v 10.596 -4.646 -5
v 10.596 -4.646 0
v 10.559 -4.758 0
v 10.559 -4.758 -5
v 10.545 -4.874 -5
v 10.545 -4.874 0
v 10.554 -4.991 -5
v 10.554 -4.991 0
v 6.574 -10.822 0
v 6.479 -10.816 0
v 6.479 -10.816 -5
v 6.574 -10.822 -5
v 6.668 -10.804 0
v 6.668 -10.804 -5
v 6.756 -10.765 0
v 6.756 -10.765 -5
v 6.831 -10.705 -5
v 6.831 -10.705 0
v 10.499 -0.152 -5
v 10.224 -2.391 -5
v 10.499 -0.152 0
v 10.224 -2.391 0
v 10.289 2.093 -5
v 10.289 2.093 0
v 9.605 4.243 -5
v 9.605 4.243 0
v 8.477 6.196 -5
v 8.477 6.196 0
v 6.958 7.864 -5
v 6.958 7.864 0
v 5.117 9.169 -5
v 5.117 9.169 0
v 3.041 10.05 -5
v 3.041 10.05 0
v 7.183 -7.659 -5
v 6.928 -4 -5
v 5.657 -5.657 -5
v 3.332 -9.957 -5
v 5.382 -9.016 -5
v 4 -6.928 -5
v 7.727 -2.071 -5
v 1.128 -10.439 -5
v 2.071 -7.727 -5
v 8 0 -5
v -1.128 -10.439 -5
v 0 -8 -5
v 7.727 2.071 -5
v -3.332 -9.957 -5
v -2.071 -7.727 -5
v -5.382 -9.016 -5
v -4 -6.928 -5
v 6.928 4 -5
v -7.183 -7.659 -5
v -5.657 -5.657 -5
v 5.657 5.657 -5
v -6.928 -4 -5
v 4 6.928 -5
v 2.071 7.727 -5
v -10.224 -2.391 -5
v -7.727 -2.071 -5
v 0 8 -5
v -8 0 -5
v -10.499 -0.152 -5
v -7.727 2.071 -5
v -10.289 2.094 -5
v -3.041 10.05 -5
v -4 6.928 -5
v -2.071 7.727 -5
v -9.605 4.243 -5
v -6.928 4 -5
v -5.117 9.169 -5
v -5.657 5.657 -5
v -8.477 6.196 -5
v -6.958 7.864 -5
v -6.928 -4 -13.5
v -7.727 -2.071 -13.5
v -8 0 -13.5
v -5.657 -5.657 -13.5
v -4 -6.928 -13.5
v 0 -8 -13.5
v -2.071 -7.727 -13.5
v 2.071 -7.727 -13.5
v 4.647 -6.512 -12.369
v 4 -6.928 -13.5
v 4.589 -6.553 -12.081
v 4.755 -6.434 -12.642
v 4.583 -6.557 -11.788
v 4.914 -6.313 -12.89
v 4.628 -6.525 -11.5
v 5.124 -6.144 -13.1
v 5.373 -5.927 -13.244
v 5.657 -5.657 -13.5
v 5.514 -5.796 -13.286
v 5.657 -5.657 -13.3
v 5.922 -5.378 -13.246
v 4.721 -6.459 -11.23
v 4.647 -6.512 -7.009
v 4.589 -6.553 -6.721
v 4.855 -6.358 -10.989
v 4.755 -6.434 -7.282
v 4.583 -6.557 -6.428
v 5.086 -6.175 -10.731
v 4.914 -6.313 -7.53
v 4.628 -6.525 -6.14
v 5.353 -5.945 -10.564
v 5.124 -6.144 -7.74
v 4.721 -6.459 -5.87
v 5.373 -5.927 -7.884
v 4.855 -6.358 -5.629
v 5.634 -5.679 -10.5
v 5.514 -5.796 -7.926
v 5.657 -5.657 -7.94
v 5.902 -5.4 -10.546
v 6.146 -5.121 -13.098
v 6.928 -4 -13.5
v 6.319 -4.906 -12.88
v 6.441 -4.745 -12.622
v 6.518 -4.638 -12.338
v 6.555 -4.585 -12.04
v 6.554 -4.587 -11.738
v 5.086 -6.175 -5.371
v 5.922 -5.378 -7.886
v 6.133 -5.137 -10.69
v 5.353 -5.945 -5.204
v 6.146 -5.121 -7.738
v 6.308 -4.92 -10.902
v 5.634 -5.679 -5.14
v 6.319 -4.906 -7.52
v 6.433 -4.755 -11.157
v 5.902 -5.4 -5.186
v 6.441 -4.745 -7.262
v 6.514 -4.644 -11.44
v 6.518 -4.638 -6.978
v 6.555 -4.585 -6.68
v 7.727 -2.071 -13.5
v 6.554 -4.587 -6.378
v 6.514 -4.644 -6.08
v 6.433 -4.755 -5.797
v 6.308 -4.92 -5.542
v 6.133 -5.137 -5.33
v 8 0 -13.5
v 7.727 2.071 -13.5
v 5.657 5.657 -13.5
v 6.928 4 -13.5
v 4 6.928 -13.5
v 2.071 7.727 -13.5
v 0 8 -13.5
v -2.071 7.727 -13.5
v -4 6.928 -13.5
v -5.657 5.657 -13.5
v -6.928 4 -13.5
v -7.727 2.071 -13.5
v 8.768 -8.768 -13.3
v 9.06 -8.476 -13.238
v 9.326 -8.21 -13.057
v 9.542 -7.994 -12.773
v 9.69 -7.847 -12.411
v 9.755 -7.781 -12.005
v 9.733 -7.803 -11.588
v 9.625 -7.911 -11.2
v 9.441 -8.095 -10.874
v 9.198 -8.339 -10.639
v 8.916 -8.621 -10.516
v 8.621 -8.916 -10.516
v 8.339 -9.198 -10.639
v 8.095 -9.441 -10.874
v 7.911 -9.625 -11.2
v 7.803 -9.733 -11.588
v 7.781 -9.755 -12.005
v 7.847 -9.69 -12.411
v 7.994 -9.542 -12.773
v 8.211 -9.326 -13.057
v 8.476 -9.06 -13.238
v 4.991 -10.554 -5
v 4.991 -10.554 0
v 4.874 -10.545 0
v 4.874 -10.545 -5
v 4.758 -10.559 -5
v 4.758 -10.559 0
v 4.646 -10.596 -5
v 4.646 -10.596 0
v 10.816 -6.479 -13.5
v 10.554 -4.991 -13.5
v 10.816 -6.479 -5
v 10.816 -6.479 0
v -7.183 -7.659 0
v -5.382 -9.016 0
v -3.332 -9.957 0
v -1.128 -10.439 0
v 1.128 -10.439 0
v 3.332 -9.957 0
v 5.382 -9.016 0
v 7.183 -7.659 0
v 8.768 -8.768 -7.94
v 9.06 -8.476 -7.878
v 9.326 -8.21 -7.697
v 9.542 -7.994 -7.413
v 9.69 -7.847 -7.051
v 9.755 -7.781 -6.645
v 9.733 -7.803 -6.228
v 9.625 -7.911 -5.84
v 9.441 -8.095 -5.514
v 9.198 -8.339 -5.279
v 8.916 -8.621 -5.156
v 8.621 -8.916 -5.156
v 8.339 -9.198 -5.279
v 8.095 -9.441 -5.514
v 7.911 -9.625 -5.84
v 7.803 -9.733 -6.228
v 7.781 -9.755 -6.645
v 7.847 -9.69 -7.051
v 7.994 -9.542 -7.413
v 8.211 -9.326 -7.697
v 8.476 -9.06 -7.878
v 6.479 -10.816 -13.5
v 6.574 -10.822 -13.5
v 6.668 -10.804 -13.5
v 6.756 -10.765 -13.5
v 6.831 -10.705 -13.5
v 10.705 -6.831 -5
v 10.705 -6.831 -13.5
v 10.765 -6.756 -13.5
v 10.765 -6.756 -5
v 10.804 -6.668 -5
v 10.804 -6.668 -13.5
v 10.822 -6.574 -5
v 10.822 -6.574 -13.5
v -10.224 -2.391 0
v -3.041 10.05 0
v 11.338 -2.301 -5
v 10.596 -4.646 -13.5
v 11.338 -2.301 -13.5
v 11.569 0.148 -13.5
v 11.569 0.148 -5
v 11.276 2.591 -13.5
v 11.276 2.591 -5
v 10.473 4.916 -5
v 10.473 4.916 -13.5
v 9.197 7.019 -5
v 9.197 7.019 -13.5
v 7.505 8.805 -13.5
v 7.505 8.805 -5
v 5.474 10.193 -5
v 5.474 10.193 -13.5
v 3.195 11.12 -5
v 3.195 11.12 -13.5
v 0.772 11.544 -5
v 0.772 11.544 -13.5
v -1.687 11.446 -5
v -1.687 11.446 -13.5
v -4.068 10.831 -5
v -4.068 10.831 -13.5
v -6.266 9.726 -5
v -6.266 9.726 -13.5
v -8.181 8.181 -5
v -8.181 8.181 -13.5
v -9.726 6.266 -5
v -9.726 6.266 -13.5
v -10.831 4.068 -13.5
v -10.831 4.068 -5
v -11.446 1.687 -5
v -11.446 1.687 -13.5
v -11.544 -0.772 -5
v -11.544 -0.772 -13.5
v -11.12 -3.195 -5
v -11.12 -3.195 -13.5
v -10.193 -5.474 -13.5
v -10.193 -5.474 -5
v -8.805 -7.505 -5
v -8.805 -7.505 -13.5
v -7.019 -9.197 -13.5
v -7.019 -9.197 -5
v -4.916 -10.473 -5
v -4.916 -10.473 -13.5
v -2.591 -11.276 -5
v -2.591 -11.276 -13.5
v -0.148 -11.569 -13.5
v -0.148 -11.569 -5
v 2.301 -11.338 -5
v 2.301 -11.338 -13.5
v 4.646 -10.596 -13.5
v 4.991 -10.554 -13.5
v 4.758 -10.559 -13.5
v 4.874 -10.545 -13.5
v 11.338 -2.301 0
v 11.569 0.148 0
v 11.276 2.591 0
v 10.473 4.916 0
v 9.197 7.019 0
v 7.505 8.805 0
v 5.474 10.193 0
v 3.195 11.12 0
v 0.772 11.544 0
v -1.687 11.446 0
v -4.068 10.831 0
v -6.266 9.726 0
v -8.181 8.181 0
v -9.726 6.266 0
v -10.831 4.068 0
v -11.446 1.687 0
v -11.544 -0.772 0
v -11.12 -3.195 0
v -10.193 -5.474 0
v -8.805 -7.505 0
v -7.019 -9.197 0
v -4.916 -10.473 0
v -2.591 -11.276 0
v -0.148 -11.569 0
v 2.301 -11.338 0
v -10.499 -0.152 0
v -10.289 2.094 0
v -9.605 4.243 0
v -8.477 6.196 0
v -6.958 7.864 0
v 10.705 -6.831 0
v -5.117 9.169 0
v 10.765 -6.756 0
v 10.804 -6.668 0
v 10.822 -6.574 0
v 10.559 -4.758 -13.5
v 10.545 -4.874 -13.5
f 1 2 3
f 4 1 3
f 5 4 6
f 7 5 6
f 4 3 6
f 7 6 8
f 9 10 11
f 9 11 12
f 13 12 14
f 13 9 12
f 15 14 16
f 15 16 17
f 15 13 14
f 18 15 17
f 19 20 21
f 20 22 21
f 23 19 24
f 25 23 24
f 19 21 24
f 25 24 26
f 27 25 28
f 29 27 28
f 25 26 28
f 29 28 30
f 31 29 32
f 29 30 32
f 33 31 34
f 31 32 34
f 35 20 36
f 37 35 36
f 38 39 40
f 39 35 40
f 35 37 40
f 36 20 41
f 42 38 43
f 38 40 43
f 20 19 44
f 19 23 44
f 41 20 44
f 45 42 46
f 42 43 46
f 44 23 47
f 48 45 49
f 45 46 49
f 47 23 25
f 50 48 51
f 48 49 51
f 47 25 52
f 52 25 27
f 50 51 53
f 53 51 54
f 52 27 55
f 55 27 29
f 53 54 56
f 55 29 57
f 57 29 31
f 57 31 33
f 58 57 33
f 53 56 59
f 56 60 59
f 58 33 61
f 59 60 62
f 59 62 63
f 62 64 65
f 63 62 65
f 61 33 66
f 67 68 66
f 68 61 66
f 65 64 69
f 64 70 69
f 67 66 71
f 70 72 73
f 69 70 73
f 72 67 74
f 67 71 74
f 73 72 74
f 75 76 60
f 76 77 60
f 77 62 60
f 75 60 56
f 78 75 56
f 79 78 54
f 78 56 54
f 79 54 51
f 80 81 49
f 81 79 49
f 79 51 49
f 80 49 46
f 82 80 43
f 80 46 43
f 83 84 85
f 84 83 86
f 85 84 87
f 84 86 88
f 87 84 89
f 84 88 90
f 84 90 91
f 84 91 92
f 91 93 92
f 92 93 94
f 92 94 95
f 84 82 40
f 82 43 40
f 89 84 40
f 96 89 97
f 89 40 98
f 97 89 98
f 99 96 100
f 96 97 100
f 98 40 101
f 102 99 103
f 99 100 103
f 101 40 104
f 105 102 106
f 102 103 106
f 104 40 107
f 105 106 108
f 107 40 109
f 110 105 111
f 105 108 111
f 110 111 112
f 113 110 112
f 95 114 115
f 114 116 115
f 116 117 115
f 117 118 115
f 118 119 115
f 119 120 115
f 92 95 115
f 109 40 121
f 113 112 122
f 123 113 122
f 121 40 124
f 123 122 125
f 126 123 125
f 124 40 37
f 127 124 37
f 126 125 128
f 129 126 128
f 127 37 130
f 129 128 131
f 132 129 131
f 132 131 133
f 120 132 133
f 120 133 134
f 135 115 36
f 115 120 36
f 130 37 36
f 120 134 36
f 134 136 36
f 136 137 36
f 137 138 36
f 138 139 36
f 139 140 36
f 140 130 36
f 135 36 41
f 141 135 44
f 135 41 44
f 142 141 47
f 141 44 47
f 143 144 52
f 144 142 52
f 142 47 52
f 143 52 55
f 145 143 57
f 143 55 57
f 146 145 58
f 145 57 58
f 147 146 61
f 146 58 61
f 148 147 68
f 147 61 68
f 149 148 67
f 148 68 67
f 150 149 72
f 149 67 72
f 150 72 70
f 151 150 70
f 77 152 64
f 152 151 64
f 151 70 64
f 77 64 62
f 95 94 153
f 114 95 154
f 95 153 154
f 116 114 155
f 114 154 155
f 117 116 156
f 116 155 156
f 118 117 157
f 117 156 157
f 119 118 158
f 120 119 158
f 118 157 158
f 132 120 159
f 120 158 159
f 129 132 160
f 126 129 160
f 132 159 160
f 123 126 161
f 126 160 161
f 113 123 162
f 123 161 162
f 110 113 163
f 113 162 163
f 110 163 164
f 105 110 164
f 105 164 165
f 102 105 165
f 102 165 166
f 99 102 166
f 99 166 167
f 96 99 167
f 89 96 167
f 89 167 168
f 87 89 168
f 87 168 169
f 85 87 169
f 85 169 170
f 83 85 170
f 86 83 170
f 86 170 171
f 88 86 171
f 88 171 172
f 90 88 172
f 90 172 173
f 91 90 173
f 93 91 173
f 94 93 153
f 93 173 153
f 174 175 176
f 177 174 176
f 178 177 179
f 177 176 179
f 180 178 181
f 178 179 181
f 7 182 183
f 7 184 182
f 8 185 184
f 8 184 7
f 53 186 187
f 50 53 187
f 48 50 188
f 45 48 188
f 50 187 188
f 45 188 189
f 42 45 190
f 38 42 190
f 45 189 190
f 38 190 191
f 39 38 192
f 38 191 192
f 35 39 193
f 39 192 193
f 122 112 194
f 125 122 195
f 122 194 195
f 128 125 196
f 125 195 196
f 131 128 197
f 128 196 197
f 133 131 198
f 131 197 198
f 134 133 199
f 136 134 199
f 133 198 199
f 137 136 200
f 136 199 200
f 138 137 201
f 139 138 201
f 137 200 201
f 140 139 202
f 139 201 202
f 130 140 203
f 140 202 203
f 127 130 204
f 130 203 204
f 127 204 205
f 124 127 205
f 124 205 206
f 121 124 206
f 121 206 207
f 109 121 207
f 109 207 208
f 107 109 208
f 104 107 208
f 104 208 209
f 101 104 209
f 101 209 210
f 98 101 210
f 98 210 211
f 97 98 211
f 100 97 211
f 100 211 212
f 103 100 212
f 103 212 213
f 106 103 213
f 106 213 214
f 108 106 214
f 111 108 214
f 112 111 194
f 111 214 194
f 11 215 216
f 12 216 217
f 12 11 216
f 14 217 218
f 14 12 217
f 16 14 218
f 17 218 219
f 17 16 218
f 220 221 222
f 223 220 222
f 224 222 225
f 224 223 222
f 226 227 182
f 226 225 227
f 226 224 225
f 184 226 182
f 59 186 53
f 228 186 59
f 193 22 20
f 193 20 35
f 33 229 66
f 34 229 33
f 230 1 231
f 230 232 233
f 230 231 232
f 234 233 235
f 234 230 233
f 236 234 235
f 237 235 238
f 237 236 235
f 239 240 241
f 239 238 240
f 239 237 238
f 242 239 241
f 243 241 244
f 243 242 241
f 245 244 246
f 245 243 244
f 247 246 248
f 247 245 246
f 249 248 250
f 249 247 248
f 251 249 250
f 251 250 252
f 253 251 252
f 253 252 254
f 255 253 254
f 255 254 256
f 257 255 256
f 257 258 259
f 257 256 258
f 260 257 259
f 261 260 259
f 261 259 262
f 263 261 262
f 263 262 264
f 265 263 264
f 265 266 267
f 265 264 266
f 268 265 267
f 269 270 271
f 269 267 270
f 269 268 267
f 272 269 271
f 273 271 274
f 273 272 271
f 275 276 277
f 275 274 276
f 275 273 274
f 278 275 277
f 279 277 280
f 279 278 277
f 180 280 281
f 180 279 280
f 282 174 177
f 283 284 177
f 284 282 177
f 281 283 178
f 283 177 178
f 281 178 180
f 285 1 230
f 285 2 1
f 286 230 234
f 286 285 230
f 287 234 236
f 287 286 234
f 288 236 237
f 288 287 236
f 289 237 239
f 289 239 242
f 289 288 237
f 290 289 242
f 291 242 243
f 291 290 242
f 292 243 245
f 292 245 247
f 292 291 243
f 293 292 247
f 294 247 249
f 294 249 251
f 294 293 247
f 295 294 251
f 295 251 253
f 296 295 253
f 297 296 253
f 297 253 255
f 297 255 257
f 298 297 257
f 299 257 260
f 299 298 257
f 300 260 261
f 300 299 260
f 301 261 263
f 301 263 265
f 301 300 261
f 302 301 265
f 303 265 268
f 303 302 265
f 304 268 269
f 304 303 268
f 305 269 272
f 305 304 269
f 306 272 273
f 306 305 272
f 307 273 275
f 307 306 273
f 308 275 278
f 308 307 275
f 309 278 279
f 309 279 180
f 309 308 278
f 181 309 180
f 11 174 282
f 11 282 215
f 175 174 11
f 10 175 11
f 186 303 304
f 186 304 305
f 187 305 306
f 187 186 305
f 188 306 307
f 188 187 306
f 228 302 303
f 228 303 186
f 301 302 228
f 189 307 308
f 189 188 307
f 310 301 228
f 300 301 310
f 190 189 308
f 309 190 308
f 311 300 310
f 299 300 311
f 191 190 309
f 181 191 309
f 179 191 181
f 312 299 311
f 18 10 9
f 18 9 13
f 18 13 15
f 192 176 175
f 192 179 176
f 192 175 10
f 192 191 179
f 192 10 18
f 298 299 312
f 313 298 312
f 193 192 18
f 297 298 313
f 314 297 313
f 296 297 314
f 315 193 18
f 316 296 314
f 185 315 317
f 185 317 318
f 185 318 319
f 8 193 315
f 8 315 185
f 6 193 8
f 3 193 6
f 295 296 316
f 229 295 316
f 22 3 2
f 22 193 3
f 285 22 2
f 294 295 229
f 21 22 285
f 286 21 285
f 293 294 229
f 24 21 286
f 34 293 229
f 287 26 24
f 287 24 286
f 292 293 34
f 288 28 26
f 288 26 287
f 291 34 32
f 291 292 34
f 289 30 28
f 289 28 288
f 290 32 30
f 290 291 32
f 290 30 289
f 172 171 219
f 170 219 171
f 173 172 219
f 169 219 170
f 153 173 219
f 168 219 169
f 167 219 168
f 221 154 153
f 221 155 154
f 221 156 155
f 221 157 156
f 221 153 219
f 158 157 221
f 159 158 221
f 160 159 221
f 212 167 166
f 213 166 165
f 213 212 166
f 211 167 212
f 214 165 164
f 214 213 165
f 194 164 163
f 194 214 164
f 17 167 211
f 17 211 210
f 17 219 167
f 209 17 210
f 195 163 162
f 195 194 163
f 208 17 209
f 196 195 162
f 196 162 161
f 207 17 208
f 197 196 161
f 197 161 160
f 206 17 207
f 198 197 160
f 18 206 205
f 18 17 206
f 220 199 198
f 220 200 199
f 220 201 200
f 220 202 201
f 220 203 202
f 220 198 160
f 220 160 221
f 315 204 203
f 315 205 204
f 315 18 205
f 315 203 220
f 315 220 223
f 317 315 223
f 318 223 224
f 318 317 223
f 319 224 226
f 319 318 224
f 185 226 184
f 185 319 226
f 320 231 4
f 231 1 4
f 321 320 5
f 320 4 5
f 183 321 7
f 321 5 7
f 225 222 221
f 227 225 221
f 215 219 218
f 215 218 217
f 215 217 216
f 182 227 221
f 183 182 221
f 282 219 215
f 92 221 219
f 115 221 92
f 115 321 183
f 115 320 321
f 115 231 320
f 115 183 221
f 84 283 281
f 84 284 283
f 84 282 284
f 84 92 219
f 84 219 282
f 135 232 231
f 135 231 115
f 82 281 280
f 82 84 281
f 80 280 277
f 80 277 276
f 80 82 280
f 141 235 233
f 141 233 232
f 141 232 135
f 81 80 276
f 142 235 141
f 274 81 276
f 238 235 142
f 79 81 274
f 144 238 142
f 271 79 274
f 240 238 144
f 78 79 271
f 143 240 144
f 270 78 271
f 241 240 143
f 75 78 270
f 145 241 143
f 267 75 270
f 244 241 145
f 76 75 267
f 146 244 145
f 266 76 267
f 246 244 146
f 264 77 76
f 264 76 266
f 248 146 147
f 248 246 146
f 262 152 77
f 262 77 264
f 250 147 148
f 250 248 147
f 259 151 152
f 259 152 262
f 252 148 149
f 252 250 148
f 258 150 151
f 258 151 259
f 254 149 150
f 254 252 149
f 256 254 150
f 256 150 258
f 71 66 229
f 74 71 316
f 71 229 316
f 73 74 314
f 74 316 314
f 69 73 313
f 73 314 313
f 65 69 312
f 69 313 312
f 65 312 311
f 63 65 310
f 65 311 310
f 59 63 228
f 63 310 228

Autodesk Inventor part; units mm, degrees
ref_plane "YZ Plane" through (0, 0, 0) normal (1, 0, 0) x (0, 1, 0)
ref_plane "XZ Plane" through (0, 0, 0) normal (0, 1, 0) x (-1, 0, 0)
ref_plane "XY Plane" through (0, 0, 0) normal (0, 0, 1) x (1, 0, 0)
sketch "Sketch1" plane through (0, 0, 0) normal (0, 0, 1) x (1, 0, 0)
  line L0 (9.6801, -14.008) -> (7.2052, -11.5331) construction
  line L1 (7.2052, -11.5331) -> (11.5893, -7.1491) construction
  line L2 (11.5893, -7.1491) -> (14.0642, -9.6239) construction
  line L3 (14.0642, -9.6239) -> (9.6801, -14.008) construction
  arc A0 (12.6369, -4.7496) -> (4.7496, -12.6369) centre (0, 0) ccw construction
  line L4 (10.9298, -3.0424) -> (12.6369, -4.7496) construction
  line L5 (11.6618, -4.6122) -> (10.9298, -3.0424) construction
  arc A1 (11.6618, -4.6122) -> (10.8551, -4.47) centre (11.2086, -4.8235) ccw construction
  line L6 (10.7915, -4.5335) -> (10.8551, -4.47) construction
  arc A2 (10.7915, -4.5335) -> (10.6527, -4.9738) centre (11.1451, -4.887) ccw construction
  line L7 (10.915, -6.4612) -> (10.6527, -4.9738) construction
  arc A3 (10.7761, -6.9016) -> (10.915, -6.4612) centre (10.4226, -6.548) ccw construction
  line L8 (6.9016, -10.7761) -> (10.7761, -6.9016) construction
  arc A4 (6.4612, -10.915) -> (6.9016, -10.7761) centre (6.548, -10.4226) ccw construction
  line L9 (6.4612, -10.915) -> (4.9738, -10.6527) construction
  arc A5 (4.9738, -10.6527) -> (4.5335, -10.7915) centre (4.887, -11.1451) ccw construction
  line L10 (4.5335, -10.7915) -> (4.47, -10.8551) construction
  arc A6 (4.47, -10.8551) -> (4.6122, -11.6618) centre (4.8235, -11.2086) ccw construction
  line L11 (4.6122, -11.6618) -> (3.0424, -10.9298) construction
  line L12 (3.0424, -10.9298) -> (4.7496, -12.6369) construction
  line L13 (-1.7167, -14.6498) -> (-1.7167, -17.5) construction
  line L14 (-1.7167, -17.5) -> (1.7167, -17.5) construction
  line L15 (1.7167, -14.6498) -> (1.7167, -17.5) construction
  arc A7 (1.7167, -14.6498) -> (6.9595, -13.0049) centre (0, 0) ccw construction
  arc A8 (6.9595, -13.0049) -> (8.2728, -15.1789) centre (8.2994, -13.6792) ccw construction
  line L16 (8.2728, -15.1789) -> (7.6816, -15.1684) construction
  arc A9 (8.5249, -17.8901) -> (7.6816, -15.1684) centre (7.655, -16.6682) ccw construction
  line L17 (8.5249, -17.8901) -> (13.5161, -14.3366) construction
  line L18 (13.5161, -14.3366) -> (13.5161, -12.2823) construction
  line L19 (13.5161, -12.2823) -> (14.6168, -12.2823) construction
  line L20 (14.6168, -12.2823) -> (14.6168, -1.9776) construction
  arc A10 (14.6168, -1.9776) -> (1.7167, 14.6498) centre (0, 0) ccw construction
  line L21 (1.7167, 14.6498) -> (1.7167, 17.5) construction
  line L22 (-1.7167, 17.5) -> (1.7167, 17.5) construction
  line L23 (-1.7167, 14.6498) -> (-1.7167, 17.5) construction
  arc A11 (-1.7167, 14.6498) -> (-14.2817, -3.6872) centre (0, 0) ccw construction
  line L24 (-14.2817, -3.6872) -> (-15.4135, -5.7935) construction
  arc A12 (-15.4135, -5.7935) -> (-14.5984, -8.502) centre (-13.6517, -6.7402) ccw construction
  line L25 (-14.5984, -8.502) -> (-9.6326, -11.1703) construction
  arc A13 (-9.6326, -11.1703) -> (-1.7167, -14.6498) centre (0, 0) ccw construction
  line L26 (-24.6, 24.6) -> (25.2, -25.2) construction
  line L27 (25.2, 24.6) -> (-24.6, -25.2) construction
  arc A14 (-3.041, 10.05) -> (-10.224, -2.3914) centre (0, 0) ccw
  circle A15 centre (0, 0) radius 10.1 construction
  line L28 (-3.041, 10.05) -> (3.041, 10.05)
  line L29 (-7.1831, -7.6586) -> (-10.224, -2.3914)
  line L30 (10.224, -2.3914) -> (7.1831, -7.6586)
  arc A16 (3.041, 10.05) -> (-3.041, 10.05) centre (0, 0) ccw
  arc A17 (10.224, -2.3914) -> (3.041, 10.05) centre (0, 0) ccw
  arc A18 (7.1831, -7.6586) -> (10.224, -2.3914) centre (0, 0) ccw
  arc A19 (-7.1831, -7.6586) -> (7.1831, -7.6586) centre (0, 0) ccw
  arc A20 (-10.224, -2.3914) -> (-7.1831, -7.6586) centre (0, 0) ccw
  arc A21 (10.7054, -6.8309) -> (10.8165, -6.4786) centre (10.4226, -6.548) ccw
  line L31 (10.8165, -6.4786) -> (10.5542, -4.9912)
  arc A22 (10.7208, -4.4628) -> (10.5956, -4.6461) centre (11.1451, -4.887) ccw construction
  line L32 (10.7208, -4.4628) -> (10.7844, -4.3992) construction
  arc A23 (11.7601, -5.0598) -> (10.7844, -4.3992) centre (11.2086, -4.8235) ccw construction
  line L33 (11.7601, -5.0598) -> (10.5994, -2.5707) construction
  line L34 (10.5994, -2.5707) -> (12.5972, -4.5684) construction
  arc A24 (12.5972, -4.5684) -> (4.5684, -12.5972) centre (0, 0) ccw construction
  line L35 (4.5684, -12.5972) -> (2.5707, -10.5994) construction
  line L36 (2.5707, -10.5994) -> (4.2491, -11.3821) construction
  arc A25 (4.3992, -10.7844) -> (4.2491, -11.3821) centre (4.8235, -11.2086) ccw construction
  line L37 (4.3992, -10.7844) -> (4.4628, -10.7208) construction
  arc A26 (4.9912, -10.5542) -> (4.6461, -10.5956) centre (4.887, -11.1451) ccw
  line L38 (4.9912, -10.5542) -> (6.4786, -10.8165)
  arc A27 (6.4786, -10.8165) -> (6.8309, -10.7054) centre (6.548, -10.4226) ccw
  line L39 (6.8309, -10.7054) -> (10.7054, -6.8309)
  circle A28 centre (0, 0) radius 11.5695
  arc A29 (4.6461, -10.5956) -> (4.4628, -10.7208) centre (4.887, -11.1451) ccw construction
  arc A30 (10.5956, -4.6461) -> (10.5542, -4.9912) centre (11.1451, -4.887) ccw
  dimension "d4" = 20.2
  dimension "d5" = 10.05
  dimension "d6" = 21
  dimension "d9" = 360
  dimension "d11" = 0.1
extrude "Extrusion1" add sketch "Sketch1" against normal blind 5 contours A16 L28 | L29 A20 | A18 L30 | L39 A27 L38 A26 A28 A30 L31 A21 | A28
sketch "Sketch3" plane through (0, 0, -5) normal (0, 0, -1) x (-1, 0, 0)
  line L0 (10.224, -2.3914) -> (7.1831, -7.6586) projected
  arc A0 (-7.1831, -7.6586) -> (7.1831, -7.6586) centre (0, 0) ccw projected
  line L1 (-7.1831, -7.6586) -> (-10.224, -2.3914) projected
  arc A1 (-3.041, 10.05) -> (-10.224, -2.3914) centre (0, 0) ccw projected
  line L2 (-3.041, 10.05) -> (3.041, 10.05) projected
  arc A2 (10.224, -2.3914) -> (3.041, 10.05) centre (0, 0) ccw projected
  arc A3 (-10.8165, -6.4786) -> (-10.7054, -6.8309) centre (-10.4226, -6.548) ccw projected
  line L3 (-10.7054, -6.8309) -> (-6.8309, -10.7054) projected
  arc A4 (-6.8309, -10.7054) -> (-6.4786, -10.8165) centre (-6.548, -10.4226) ccw projected
  line L4 (-6.4786, -10.8165) -> (-4.9912, -10.5542) projected
  arc A5 (-4.6461, -10.5956) -> (-4.9912, -10.5542) centre (-4.887, -11.1451) ccw projected
  arc A6 (-4.6461, -10.5956) -> (-10.5956, -4.6461) centre (0, 0) ccw projected
  arc A7 (-10.5542, -4.9912) -> (-10.5956, -4.6461) centre (-11.1451, -4.887) ccw projected
  line L5 (-10.5542, -4.9912) -> (-10.8165, -6.4786) projected
  circle A8 centre (0, 0) radius 8
  circle A9 centre (0, 0) radius 10.5
  dimension "d17" = 16
extrude "Extrusion3" add sketch "Sketch3" along normal blind 8.5 contours A9 L0 | L0 A0 L1 A1 L2 A2 | A9 L1 | L2 A9 | L5 A7 A6 A5 L4 A4 L3 A3
sketch "Sketch4" plane through (6.8309, -10.7054, 0) normal (0.7071, -0.7071, 0) x (0, 0, -1)
  line L0 (0, 0) -> (0, 5.4794) construction
  line L1 (0, 0) -> (13.5, 0) construction
  line L2 (13.5, 5.4794) -> (13.5, 0) construction
  line L3 (0, 5.4794) -> (13.5, 5.4794) construction
  line L4 (0, 2.7397) -> (13.5, 2.7397) construction
  circle A0 centre (11.9, 2.7397) radius 1.4
  circle A1 centre (6.54, 2.7397) radius 1.4
  dimension "d20" = 2.8
  dimension "d21" = 1.6
  dimension "d47" = 2.8
  dimension "d48" = 5.36
extrude "Extrusion4" cut sketch "Sketch4" against normal up to surface
properties part number "20_focus_inlet_linearflexure_objective_mount_v0"
